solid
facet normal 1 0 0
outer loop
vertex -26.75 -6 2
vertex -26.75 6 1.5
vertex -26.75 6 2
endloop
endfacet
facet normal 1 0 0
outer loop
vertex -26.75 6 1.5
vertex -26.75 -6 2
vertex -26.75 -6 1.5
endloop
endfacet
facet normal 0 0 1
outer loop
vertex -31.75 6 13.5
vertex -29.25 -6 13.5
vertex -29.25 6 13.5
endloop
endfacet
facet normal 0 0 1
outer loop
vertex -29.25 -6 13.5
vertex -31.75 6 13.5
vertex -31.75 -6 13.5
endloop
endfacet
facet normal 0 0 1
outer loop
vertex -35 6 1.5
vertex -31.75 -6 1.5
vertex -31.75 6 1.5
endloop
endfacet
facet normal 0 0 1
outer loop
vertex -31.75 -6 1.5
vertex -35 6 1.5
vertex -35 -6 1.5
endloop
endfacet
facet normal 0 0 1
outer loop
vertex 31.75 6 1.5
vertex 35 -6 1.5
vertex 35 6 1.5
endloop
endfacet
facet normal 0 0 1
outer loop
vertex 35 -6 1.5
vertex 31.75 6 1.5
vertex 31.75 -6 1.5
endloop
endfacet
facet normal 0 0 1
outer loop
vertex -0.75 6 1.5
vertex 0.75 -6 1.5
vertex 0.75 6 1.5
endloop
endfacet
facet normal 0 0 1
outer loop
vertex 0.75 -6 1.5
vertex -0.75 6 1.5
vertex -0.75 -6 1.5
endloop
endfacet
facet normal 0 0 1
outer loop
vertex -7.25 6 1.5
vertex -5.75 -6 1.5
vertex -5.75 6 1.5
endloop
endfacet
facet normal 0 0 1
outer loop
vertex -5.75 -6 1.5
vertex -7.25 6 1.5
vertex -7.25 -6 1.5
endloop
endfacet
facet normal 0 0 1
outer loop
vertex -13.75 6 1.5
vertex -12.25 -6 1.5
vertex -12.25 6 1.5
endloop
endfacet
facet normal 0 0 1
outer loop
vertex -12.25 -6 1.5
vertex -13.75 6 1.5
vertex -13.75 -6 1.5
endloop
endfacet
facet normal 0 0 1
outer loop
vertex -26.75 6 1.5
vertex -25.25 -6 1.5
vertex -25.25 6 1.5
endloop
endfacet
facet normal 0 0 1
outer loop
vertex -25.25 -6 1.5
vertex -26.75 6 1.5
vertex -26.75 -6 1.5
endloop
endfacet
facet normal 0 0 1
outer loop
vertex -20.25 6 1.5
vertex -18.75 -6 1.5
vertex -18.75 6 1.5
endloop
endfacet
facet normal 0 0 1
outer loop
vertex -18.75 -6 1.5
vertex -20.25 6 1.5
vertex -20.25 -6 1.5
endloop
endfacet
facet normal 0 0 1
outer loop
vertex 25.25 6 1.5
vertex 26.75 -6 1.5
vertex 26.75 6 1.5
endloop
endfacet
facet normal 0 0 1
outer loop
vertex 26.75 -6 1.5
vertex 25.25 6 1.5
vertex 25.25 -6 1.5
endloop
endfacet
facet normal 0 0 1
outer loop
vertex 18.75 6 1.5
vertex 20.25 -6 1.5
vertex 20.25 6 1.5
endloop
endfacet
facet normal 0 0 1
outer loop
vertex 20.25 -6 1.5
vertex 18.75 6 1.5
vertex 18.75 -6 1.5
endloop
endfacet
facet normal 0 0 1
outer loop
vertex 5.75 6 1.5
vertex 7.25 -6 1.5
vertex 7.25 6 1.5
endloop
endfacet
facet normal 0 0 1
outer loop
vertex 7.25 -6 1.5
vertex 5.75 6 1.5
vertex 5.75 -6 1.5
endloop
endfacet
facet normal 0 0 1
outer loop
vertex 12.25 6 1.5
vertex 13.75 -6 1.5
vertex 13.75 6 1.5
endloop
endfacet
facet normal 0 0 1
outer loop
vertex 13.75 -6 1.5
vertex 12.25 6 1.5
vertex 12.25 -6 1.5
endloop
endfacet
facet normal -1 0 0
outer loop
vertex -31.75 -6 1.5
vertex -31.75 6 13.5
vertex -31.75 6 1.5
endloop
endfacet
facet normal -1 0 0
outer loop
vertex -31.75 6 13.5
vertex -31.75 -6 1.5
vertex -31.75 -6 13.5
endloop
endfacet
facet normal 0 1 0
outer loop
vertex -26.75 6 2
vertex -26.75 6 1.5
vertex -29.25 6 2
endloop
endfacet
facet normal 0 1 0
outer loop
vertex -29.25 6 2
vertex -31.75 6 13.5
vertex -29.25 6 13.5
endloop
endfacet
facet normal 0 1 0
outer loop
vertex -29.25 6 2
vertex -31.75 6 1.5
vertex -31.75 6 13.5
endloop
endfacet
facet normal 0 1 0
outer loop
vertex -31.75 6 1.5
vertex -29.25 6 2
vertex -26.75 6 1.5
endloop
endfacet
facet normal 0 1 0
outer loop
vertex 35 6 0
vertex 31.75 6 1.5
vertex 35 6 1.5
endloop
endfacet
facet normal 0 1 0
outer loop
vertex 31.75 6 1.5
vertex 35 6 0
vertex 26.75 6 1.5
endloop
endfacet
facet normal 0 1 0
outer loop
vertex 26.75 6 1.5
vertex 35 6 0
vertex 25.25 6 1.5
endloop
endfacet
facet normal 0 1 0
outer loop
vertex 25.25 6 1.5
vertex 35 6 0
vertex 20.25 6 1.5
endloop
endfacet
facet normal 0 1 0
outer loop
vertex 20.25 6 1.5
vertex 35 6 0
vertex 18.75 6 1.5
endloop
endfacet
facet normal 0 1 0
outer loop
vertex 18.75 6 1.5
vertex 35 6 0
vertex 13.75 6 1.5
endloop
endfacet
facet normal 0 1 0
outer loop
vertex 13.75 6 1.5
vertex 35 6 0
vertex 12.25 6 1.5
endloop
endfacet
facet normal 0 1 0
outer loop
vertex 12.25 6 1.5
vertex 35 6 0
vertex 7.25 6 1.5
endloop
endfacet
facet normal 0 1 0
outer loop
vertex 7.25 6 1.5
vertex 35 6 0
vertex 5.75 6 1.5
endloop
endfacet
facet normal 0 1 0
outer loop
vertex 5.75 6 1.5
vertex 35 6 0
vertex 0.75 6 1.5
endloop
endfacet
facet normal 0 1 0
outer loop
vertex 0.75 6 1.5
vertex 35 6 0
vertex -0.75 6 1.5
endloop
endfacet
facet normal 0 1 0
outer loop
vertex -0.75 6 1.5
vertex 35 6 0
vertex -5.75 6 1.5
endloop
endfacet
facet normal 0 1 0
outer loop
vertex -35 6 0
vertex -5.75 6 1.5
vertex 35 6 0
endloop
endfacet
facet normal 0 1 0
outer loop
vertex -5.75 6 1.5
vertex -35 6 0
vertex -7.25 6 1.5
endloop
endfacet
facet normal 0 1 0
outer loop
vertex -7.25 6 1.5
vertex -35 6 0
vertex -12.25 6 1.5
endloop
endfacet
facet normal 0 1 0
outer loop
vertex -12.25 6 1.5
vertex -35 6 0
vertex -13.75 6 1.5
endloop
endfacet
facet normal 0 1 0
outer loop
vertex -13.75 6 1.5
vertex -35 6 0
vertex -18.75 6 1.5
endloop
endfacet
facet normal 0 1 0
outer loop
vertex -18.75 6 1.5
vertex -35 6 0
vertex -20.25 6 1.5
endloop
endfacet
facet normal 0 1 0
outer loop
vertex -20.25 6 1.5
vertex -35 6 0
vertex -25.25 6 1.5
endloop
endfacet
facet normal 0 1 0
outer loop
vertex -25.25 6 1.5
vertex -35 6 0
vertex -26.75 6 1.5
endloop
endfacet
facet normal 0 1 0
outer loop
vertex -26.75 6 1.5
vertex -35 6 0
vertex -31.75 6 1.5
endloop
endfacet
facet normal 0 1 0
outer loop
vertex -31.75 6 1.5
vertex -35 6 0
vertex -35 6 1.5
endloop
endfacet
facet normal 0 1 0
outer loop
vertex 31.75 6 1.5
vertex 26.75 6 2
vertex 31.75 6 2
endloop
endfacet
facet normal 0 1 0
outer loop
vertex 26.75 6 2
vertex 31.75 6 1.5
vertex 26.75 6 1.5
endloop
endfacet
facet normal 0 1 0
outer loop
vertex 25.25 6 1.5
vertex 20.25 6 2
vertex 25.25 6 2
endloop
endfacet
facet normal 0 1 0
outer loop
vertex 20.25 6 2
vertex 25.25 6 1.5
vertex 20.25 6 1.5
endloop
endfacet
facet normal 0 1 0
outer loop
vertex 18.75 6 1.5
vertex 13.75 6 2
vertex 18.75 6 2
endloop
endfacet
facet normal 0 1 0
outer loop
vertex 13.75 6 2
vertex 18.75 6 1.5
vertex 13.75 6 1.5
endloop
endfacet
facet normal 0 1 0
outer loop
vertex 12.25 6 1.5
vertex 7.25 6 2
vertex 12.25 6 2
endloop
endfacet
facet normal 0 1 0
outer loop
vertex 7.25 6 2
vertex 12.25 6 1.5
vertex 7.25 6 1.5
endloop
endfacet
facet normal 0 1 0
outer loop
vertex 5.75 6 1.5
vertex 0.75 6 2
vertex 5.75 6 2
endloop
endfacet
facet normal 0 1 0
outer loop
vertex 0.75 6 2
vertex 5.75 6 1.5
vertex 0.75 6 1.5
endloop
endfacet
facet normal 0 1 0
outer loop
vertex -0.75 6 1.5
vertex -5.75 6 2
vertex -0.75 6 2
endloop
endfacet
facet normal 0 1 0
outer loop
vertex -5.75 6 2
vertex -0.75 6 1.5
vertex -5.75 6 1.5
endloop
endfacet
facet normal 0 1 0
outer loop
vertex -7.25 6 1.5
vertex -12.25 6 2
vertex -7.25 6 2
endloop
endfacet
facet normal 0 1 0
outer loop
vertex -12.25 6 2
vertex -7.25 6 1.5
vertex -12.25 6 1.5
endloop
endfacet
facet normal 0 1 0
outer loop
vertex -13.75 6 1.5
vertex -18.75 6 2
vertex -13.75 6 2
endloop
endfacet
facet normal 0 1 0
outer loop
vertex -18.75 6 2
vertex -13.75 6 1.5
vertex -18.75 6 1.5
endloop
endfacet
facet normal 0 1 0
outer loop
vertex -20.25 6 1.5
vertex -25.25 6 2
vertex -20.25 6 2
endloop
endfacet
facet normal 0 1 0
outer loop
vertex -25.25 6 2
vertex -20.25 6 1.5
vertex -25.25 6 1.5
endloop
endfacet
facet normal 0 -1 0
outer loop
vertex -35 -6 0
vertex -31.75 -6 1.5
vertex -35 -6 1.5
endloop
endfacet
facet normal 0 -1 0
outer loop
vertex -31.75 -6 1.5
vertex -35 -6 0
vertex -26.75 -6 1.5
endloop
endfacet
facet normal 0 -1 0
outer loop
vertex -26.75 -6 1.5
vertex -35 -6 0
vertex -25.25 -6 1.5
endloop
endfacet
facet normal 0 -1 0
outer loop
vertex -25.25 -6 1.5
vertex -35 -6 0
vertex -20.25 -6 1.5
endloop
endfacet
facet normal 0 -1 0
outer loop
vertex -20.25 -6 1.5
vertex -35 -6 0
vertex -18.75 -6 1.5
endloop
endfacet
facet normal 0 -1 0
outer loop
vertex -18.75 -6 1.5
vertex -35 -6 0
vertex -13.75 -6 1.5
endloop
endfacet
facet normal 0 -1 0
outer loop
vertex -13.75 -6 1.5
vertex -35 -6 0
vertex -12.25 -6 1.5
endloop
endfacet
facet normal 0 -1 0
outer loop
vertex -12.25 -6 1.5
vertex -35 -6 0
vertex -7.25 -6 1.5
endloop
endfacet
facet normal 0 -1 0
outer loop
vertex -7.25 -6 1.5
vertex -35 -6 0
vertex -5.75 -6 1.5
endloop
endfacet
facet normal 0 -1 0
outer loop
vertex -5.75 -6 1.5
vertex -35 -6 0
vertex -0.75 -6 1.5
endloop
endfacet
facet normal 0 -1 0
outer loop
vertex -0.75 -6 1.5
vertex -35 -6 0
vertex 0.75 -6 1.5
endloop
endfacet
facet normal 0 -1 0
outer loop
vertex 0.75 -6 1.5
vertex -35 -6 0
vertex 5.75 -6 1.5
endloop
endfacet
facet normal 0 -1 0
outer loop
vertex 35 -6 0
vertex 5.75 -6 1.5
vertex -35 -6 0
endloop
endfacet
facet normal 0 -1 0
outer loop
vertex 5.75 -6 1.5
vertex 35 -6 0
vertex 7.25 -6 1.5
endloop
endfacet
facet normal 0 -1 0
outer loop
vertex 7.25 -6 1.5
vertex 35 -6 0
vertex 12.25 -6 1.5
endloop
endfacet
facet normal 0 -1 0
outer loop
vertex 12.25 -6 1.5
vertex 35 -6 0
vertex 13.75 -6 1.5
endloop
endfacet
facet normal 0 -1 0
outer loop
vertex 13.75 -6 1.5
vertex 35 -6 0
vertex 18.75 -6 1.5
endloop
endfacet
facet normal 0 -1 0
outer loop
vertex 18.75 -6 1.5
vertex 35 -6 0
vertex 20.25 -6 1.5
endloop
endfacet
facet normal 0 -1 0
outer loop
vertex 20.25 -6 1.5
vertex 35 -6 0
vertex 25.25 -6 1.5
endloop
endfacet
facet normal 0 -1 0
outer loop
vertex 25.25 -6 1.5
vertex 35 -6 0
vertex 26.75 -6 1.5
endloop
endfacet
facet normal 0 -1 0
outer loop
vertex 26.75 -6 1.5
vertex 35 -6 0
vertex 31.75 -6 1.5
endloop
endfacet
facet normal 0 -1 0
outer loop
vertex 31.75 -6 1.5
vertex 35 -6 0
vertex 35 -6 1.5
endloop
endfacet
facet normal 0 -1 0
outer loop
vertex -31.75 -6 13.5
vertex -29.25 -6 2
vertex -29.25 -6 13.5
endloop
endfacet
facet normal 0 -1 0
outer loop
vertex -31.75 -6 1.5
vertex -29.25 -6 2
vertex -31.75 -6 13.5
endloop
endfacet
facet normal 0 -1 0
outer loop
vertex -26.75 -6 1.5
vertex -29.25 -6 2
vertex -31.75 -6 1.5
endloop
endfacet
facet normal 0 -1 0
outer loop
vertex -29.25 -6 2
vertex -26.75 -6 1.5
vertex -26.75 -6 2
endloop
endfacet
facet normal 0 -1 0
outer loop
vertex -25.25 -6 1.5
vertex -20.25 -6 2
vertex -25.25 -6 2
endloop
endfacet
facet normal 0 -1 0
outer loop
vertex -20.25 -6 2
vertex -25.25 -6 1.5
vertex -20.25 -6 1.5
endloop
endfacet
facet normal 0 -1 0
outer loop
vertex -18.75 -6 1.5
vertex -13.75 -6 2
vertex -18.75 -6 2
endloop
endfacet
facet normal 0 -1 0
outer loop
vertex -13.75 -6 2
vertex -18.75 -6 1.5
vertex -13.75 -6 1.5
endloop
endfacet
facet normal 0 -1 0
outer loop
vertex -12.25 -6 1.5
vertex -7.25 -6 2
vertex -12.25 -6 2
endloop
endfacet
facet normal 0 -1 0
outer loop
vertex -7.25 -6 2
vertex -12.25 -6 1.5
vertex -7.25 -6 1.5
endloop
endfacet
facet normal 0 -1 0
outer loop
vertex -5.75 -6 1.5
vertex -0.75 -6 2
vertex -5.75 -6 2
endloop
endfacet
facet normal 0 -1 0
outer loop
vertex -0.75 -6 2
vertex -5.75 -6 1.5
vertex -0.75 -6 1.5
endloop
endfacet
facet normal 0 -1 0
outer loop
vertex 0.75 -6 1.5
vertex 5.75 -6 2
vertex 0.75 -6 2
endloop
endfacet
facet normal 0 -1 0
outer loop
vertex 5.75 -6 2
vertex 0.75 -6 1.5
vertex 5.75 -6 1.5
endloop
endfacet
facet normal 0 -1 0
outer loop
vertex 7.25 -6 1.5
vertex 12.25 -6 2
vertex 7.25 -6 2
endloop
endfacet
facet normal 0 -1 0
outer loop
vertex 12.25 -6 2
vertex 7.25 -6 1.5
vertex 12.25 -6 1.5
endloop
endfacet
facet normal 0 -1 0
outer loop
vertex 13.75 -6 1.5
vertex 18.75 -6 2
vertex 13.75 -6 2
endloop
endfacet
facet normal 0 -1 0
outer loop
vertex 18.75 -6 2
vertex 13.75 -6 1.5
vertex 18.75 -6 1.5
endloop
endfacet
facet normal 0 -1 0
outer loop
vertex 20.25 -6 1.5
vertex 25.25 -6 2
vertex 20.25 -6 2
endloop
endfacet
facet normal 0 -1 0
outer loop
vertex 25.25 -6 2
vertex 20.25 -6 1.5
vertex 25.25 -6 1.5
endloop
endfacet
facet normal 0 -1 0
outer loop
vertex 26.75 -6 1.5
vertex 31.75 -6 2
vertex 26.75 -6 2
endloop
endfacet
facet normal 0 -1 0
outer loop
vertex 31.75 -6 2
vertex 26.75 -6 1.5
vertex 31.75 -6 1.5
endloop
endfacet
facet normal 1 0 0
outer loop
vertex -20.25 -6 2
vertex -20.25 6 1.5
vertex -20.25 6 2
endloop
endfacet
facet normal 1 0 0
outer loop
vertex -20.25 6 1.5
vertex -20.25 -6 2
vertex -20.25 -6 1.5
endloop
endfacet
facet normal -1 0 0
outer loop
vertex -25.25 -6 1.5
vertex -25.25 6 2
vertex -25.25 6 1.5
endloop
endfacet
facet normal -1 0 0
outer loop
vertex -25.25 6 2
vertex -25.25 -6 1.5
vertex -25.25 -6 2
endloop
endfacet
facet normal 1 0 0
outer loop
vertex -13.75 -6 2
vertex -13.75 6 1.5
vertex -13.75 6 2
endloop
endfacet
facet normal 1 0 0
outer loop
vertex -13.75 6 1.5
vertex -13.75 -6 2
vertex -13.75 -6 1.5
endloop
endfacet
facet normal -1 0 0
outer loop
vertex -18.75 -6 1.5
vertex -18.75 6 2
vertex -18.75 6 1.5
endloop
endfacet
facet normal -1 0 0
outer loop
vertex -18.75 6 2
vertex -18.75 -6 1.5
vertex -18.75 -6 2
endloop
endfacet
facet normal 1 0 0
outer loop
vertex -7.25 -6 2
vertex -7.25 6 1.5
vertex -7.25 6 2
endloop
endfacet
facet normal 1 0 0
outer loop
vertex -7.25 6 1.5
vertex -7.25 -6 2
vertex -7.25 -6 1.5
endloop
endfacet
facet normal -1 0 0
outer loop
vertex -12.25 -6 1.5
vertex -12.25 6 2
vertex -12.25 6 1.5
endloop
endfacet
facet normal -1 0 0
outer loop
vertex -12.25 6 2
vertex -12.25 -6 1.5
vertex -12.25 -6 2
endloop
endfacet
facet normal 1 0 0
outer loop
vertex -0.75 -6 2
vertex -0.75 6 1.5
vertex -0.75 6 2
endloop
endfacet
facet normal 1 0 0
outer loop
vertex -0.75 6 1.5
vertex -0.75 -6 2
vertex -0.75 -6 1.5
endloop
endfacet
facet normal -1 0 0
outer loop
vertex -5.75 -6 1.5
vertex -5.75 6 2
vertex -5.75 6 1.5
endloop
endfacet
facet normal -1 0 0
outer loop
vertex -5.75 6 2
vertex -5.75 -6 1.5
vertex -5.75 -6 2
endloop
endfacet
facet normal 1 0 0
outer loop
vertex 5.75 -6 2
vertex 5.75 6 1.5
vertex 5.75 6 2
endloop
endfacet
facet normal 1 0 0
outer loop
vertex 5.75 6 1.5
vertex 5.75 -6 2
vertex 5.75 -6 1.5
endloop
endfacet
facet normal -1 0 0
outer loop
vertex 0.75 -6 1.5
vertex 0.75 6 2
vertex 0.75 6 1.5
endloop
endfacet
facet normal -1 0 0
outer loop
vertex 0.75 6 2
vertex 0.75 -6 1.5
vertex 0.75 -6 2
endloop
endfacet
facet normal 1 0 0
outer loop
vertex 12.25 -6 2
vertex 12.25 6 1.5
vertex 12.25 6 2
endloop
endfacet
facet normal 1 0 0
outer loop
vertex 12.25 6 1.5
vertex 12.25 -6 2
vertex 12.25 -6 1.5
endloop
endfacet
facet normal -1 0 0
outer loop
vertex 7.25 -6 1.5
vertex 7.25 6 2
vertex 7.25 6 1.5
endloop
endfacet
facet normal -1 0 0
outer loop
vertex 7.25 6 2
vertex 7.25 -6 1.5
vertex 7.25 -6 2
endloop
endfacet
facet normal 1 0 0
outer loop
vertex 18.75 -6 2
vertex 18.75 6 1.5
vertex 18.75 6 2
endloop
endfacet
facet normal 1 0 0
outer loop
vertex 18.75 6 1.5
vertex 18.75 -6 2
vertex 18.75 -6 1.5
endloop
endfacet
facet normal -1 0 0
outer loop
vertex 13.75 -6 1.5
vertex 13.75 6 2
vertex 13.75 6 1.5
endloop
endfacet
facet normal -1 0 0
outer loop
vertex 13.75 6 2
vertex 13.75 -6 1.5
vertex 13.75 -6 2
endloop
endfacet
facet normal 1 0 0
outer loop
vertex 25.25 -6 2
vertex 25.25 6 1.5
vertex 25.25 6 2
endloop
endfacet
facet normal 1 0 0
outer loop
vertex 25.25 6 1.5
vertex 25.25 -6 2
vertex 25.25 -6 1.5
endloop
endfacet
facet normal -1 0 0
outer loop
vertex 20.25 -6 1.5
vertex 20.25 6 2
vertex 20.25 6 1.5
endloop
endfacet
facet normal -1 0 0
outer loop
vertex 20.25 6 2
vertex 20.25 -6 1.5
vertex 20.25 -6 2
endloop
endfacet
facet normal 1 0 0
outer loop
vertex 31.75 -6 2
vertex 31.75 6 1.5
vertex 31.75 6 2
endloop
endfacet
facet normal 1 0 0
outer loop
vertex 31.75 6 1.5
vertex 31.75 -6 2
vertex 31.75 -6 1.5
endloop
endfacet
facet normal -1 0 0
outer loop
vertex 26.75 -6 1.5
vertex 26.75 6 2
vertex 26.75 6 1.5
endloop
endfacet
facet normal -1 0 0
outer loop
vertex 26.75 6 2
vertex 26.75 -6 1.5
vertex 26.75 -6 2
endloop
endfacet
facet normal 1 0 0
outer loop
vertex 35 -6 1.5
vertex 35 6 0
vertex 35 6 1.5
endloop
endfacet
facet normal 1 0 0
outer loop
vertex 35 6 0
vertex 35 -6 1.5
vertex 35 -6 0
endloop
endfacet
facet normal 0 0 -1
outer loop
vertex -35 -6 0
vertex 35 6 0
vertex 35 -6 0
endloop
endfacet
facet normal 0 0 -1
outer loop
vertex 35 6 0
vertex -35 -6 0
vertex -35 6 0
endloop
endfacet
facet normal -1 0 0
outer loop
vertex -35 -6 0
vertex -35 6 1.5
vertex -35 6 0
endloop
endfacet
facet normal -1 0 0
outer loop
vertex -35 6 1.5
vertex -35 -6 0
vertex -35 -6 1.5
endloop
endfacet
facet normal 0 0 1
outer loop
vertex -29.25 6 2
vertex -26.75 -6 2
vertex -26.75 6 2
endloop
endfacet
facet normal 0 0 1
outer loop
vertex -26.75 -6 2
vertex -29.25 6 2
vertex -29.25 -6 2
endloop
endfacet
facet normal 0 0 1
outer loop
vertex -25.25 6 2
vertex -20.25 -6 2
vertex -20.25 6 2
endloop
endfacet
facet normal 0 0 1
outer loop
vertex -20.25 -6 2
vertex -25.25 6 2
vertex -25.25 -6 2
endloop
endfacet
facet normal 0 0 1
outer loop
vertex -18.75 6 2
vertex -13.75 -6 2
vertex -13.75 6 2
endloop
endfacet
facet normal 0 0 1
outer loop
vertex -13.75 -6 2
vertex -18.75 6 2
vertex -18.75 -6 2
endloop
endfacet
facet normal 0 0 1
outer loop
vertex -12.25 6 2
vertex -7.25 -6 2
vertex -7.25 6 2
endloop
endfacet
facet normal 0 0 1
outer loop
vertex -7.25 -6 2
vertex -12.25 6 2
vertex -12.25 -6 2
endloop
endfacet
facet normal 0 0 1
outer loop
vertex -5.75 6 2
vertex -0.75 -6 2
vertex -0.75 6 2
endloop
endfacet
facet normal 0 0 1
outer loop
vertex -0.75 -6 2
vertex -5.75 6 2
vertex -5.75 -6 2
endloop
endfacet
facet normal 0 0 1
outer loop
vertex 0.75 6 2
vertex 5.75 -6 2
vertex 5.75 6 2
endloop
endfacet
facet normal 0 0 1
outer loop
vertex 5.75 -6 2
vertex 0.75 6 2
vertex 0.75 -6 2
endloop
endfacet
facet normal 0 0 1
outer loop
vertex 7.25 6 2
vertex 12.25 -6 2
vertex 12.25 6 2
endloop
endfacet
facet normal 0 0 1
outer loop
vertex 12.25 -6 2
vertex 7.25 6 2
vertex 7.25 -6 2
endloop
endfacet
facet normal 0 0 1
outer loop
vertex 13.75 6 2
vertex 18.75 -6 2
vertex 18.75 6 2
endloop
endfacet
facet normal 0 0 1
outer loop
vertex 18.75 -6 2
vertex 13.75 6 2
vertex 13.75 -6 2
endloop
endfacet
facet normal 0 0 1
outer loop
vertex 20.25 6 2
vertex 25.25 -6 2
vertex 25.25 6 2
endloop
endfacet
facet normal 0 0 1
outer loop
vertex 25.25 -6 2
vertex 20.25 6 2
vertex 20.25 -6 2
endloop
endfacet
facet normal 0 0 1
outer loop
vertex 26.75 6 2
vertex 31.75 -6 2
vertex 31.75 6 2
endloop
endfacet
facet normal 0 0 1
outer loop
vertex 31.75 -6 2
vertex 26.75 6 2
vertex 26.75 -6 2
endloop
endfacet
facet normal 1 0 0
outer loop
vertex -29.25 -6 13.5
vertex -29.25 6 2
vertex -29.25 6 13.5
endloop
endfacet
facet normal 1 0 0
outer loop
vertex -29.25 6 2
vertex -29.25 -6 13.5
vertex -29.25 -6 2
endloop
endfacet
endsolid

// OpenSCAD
// 10-well comb for agarose gel casting
// Print orientation: flat on bed, teeth pointing down (-Z)

// ---------- Parameters ----------
plate_t      = 1.5;   // plate thickness (Z)
spine_len    = 70;    // spine length (X)
spine_w      = 12;    // spine width (Y)
tooth_count  = 10;    // number of teeth
tooth_w      = 5.0;   // tooth width (X)
tooth_len    = 12;    // tooth length (Y)
tooth_h      = 12;    // tooth height from plate top (Z)
gap          = 1.5;   // gap between teeth (X)
eps          = 0.5;   // cutter overshoot past faces

$fn = 64;

// ---------- Derived ----------
pitch      = tooth_w + gap;
x_start    = -(tooth_count - 1) * pitch / 2;   // first tooth centre (X)
reach      = max(spine_w / 2 + eps, tooth_len + eps); // cutter reach from origin (Y)

// ---------- Model ----------
difference() {
    union() {
        // Plate with spine
        translate([-spine_len / 2, -spine_w / 2, 0])
            cube([spine_len, spine_w, plate_t]);

        // Teeth (overhang beyond plate top)
        for (i = [0 : tooth_count - 1])
            translate([x_start + i * pitch - tooth_w / 2,
                       -tooth_len / 2, plate_t])
                cube([tooth_w, tooth_len, tooth_h]);
    }

    // Cutout: row of teeth in -Y from the plate top edge
    translate([x_start, -tooth_len / 2, plate_t + eps])
        cube([tooth_count * pitch, tooth_len, reach]);
}
